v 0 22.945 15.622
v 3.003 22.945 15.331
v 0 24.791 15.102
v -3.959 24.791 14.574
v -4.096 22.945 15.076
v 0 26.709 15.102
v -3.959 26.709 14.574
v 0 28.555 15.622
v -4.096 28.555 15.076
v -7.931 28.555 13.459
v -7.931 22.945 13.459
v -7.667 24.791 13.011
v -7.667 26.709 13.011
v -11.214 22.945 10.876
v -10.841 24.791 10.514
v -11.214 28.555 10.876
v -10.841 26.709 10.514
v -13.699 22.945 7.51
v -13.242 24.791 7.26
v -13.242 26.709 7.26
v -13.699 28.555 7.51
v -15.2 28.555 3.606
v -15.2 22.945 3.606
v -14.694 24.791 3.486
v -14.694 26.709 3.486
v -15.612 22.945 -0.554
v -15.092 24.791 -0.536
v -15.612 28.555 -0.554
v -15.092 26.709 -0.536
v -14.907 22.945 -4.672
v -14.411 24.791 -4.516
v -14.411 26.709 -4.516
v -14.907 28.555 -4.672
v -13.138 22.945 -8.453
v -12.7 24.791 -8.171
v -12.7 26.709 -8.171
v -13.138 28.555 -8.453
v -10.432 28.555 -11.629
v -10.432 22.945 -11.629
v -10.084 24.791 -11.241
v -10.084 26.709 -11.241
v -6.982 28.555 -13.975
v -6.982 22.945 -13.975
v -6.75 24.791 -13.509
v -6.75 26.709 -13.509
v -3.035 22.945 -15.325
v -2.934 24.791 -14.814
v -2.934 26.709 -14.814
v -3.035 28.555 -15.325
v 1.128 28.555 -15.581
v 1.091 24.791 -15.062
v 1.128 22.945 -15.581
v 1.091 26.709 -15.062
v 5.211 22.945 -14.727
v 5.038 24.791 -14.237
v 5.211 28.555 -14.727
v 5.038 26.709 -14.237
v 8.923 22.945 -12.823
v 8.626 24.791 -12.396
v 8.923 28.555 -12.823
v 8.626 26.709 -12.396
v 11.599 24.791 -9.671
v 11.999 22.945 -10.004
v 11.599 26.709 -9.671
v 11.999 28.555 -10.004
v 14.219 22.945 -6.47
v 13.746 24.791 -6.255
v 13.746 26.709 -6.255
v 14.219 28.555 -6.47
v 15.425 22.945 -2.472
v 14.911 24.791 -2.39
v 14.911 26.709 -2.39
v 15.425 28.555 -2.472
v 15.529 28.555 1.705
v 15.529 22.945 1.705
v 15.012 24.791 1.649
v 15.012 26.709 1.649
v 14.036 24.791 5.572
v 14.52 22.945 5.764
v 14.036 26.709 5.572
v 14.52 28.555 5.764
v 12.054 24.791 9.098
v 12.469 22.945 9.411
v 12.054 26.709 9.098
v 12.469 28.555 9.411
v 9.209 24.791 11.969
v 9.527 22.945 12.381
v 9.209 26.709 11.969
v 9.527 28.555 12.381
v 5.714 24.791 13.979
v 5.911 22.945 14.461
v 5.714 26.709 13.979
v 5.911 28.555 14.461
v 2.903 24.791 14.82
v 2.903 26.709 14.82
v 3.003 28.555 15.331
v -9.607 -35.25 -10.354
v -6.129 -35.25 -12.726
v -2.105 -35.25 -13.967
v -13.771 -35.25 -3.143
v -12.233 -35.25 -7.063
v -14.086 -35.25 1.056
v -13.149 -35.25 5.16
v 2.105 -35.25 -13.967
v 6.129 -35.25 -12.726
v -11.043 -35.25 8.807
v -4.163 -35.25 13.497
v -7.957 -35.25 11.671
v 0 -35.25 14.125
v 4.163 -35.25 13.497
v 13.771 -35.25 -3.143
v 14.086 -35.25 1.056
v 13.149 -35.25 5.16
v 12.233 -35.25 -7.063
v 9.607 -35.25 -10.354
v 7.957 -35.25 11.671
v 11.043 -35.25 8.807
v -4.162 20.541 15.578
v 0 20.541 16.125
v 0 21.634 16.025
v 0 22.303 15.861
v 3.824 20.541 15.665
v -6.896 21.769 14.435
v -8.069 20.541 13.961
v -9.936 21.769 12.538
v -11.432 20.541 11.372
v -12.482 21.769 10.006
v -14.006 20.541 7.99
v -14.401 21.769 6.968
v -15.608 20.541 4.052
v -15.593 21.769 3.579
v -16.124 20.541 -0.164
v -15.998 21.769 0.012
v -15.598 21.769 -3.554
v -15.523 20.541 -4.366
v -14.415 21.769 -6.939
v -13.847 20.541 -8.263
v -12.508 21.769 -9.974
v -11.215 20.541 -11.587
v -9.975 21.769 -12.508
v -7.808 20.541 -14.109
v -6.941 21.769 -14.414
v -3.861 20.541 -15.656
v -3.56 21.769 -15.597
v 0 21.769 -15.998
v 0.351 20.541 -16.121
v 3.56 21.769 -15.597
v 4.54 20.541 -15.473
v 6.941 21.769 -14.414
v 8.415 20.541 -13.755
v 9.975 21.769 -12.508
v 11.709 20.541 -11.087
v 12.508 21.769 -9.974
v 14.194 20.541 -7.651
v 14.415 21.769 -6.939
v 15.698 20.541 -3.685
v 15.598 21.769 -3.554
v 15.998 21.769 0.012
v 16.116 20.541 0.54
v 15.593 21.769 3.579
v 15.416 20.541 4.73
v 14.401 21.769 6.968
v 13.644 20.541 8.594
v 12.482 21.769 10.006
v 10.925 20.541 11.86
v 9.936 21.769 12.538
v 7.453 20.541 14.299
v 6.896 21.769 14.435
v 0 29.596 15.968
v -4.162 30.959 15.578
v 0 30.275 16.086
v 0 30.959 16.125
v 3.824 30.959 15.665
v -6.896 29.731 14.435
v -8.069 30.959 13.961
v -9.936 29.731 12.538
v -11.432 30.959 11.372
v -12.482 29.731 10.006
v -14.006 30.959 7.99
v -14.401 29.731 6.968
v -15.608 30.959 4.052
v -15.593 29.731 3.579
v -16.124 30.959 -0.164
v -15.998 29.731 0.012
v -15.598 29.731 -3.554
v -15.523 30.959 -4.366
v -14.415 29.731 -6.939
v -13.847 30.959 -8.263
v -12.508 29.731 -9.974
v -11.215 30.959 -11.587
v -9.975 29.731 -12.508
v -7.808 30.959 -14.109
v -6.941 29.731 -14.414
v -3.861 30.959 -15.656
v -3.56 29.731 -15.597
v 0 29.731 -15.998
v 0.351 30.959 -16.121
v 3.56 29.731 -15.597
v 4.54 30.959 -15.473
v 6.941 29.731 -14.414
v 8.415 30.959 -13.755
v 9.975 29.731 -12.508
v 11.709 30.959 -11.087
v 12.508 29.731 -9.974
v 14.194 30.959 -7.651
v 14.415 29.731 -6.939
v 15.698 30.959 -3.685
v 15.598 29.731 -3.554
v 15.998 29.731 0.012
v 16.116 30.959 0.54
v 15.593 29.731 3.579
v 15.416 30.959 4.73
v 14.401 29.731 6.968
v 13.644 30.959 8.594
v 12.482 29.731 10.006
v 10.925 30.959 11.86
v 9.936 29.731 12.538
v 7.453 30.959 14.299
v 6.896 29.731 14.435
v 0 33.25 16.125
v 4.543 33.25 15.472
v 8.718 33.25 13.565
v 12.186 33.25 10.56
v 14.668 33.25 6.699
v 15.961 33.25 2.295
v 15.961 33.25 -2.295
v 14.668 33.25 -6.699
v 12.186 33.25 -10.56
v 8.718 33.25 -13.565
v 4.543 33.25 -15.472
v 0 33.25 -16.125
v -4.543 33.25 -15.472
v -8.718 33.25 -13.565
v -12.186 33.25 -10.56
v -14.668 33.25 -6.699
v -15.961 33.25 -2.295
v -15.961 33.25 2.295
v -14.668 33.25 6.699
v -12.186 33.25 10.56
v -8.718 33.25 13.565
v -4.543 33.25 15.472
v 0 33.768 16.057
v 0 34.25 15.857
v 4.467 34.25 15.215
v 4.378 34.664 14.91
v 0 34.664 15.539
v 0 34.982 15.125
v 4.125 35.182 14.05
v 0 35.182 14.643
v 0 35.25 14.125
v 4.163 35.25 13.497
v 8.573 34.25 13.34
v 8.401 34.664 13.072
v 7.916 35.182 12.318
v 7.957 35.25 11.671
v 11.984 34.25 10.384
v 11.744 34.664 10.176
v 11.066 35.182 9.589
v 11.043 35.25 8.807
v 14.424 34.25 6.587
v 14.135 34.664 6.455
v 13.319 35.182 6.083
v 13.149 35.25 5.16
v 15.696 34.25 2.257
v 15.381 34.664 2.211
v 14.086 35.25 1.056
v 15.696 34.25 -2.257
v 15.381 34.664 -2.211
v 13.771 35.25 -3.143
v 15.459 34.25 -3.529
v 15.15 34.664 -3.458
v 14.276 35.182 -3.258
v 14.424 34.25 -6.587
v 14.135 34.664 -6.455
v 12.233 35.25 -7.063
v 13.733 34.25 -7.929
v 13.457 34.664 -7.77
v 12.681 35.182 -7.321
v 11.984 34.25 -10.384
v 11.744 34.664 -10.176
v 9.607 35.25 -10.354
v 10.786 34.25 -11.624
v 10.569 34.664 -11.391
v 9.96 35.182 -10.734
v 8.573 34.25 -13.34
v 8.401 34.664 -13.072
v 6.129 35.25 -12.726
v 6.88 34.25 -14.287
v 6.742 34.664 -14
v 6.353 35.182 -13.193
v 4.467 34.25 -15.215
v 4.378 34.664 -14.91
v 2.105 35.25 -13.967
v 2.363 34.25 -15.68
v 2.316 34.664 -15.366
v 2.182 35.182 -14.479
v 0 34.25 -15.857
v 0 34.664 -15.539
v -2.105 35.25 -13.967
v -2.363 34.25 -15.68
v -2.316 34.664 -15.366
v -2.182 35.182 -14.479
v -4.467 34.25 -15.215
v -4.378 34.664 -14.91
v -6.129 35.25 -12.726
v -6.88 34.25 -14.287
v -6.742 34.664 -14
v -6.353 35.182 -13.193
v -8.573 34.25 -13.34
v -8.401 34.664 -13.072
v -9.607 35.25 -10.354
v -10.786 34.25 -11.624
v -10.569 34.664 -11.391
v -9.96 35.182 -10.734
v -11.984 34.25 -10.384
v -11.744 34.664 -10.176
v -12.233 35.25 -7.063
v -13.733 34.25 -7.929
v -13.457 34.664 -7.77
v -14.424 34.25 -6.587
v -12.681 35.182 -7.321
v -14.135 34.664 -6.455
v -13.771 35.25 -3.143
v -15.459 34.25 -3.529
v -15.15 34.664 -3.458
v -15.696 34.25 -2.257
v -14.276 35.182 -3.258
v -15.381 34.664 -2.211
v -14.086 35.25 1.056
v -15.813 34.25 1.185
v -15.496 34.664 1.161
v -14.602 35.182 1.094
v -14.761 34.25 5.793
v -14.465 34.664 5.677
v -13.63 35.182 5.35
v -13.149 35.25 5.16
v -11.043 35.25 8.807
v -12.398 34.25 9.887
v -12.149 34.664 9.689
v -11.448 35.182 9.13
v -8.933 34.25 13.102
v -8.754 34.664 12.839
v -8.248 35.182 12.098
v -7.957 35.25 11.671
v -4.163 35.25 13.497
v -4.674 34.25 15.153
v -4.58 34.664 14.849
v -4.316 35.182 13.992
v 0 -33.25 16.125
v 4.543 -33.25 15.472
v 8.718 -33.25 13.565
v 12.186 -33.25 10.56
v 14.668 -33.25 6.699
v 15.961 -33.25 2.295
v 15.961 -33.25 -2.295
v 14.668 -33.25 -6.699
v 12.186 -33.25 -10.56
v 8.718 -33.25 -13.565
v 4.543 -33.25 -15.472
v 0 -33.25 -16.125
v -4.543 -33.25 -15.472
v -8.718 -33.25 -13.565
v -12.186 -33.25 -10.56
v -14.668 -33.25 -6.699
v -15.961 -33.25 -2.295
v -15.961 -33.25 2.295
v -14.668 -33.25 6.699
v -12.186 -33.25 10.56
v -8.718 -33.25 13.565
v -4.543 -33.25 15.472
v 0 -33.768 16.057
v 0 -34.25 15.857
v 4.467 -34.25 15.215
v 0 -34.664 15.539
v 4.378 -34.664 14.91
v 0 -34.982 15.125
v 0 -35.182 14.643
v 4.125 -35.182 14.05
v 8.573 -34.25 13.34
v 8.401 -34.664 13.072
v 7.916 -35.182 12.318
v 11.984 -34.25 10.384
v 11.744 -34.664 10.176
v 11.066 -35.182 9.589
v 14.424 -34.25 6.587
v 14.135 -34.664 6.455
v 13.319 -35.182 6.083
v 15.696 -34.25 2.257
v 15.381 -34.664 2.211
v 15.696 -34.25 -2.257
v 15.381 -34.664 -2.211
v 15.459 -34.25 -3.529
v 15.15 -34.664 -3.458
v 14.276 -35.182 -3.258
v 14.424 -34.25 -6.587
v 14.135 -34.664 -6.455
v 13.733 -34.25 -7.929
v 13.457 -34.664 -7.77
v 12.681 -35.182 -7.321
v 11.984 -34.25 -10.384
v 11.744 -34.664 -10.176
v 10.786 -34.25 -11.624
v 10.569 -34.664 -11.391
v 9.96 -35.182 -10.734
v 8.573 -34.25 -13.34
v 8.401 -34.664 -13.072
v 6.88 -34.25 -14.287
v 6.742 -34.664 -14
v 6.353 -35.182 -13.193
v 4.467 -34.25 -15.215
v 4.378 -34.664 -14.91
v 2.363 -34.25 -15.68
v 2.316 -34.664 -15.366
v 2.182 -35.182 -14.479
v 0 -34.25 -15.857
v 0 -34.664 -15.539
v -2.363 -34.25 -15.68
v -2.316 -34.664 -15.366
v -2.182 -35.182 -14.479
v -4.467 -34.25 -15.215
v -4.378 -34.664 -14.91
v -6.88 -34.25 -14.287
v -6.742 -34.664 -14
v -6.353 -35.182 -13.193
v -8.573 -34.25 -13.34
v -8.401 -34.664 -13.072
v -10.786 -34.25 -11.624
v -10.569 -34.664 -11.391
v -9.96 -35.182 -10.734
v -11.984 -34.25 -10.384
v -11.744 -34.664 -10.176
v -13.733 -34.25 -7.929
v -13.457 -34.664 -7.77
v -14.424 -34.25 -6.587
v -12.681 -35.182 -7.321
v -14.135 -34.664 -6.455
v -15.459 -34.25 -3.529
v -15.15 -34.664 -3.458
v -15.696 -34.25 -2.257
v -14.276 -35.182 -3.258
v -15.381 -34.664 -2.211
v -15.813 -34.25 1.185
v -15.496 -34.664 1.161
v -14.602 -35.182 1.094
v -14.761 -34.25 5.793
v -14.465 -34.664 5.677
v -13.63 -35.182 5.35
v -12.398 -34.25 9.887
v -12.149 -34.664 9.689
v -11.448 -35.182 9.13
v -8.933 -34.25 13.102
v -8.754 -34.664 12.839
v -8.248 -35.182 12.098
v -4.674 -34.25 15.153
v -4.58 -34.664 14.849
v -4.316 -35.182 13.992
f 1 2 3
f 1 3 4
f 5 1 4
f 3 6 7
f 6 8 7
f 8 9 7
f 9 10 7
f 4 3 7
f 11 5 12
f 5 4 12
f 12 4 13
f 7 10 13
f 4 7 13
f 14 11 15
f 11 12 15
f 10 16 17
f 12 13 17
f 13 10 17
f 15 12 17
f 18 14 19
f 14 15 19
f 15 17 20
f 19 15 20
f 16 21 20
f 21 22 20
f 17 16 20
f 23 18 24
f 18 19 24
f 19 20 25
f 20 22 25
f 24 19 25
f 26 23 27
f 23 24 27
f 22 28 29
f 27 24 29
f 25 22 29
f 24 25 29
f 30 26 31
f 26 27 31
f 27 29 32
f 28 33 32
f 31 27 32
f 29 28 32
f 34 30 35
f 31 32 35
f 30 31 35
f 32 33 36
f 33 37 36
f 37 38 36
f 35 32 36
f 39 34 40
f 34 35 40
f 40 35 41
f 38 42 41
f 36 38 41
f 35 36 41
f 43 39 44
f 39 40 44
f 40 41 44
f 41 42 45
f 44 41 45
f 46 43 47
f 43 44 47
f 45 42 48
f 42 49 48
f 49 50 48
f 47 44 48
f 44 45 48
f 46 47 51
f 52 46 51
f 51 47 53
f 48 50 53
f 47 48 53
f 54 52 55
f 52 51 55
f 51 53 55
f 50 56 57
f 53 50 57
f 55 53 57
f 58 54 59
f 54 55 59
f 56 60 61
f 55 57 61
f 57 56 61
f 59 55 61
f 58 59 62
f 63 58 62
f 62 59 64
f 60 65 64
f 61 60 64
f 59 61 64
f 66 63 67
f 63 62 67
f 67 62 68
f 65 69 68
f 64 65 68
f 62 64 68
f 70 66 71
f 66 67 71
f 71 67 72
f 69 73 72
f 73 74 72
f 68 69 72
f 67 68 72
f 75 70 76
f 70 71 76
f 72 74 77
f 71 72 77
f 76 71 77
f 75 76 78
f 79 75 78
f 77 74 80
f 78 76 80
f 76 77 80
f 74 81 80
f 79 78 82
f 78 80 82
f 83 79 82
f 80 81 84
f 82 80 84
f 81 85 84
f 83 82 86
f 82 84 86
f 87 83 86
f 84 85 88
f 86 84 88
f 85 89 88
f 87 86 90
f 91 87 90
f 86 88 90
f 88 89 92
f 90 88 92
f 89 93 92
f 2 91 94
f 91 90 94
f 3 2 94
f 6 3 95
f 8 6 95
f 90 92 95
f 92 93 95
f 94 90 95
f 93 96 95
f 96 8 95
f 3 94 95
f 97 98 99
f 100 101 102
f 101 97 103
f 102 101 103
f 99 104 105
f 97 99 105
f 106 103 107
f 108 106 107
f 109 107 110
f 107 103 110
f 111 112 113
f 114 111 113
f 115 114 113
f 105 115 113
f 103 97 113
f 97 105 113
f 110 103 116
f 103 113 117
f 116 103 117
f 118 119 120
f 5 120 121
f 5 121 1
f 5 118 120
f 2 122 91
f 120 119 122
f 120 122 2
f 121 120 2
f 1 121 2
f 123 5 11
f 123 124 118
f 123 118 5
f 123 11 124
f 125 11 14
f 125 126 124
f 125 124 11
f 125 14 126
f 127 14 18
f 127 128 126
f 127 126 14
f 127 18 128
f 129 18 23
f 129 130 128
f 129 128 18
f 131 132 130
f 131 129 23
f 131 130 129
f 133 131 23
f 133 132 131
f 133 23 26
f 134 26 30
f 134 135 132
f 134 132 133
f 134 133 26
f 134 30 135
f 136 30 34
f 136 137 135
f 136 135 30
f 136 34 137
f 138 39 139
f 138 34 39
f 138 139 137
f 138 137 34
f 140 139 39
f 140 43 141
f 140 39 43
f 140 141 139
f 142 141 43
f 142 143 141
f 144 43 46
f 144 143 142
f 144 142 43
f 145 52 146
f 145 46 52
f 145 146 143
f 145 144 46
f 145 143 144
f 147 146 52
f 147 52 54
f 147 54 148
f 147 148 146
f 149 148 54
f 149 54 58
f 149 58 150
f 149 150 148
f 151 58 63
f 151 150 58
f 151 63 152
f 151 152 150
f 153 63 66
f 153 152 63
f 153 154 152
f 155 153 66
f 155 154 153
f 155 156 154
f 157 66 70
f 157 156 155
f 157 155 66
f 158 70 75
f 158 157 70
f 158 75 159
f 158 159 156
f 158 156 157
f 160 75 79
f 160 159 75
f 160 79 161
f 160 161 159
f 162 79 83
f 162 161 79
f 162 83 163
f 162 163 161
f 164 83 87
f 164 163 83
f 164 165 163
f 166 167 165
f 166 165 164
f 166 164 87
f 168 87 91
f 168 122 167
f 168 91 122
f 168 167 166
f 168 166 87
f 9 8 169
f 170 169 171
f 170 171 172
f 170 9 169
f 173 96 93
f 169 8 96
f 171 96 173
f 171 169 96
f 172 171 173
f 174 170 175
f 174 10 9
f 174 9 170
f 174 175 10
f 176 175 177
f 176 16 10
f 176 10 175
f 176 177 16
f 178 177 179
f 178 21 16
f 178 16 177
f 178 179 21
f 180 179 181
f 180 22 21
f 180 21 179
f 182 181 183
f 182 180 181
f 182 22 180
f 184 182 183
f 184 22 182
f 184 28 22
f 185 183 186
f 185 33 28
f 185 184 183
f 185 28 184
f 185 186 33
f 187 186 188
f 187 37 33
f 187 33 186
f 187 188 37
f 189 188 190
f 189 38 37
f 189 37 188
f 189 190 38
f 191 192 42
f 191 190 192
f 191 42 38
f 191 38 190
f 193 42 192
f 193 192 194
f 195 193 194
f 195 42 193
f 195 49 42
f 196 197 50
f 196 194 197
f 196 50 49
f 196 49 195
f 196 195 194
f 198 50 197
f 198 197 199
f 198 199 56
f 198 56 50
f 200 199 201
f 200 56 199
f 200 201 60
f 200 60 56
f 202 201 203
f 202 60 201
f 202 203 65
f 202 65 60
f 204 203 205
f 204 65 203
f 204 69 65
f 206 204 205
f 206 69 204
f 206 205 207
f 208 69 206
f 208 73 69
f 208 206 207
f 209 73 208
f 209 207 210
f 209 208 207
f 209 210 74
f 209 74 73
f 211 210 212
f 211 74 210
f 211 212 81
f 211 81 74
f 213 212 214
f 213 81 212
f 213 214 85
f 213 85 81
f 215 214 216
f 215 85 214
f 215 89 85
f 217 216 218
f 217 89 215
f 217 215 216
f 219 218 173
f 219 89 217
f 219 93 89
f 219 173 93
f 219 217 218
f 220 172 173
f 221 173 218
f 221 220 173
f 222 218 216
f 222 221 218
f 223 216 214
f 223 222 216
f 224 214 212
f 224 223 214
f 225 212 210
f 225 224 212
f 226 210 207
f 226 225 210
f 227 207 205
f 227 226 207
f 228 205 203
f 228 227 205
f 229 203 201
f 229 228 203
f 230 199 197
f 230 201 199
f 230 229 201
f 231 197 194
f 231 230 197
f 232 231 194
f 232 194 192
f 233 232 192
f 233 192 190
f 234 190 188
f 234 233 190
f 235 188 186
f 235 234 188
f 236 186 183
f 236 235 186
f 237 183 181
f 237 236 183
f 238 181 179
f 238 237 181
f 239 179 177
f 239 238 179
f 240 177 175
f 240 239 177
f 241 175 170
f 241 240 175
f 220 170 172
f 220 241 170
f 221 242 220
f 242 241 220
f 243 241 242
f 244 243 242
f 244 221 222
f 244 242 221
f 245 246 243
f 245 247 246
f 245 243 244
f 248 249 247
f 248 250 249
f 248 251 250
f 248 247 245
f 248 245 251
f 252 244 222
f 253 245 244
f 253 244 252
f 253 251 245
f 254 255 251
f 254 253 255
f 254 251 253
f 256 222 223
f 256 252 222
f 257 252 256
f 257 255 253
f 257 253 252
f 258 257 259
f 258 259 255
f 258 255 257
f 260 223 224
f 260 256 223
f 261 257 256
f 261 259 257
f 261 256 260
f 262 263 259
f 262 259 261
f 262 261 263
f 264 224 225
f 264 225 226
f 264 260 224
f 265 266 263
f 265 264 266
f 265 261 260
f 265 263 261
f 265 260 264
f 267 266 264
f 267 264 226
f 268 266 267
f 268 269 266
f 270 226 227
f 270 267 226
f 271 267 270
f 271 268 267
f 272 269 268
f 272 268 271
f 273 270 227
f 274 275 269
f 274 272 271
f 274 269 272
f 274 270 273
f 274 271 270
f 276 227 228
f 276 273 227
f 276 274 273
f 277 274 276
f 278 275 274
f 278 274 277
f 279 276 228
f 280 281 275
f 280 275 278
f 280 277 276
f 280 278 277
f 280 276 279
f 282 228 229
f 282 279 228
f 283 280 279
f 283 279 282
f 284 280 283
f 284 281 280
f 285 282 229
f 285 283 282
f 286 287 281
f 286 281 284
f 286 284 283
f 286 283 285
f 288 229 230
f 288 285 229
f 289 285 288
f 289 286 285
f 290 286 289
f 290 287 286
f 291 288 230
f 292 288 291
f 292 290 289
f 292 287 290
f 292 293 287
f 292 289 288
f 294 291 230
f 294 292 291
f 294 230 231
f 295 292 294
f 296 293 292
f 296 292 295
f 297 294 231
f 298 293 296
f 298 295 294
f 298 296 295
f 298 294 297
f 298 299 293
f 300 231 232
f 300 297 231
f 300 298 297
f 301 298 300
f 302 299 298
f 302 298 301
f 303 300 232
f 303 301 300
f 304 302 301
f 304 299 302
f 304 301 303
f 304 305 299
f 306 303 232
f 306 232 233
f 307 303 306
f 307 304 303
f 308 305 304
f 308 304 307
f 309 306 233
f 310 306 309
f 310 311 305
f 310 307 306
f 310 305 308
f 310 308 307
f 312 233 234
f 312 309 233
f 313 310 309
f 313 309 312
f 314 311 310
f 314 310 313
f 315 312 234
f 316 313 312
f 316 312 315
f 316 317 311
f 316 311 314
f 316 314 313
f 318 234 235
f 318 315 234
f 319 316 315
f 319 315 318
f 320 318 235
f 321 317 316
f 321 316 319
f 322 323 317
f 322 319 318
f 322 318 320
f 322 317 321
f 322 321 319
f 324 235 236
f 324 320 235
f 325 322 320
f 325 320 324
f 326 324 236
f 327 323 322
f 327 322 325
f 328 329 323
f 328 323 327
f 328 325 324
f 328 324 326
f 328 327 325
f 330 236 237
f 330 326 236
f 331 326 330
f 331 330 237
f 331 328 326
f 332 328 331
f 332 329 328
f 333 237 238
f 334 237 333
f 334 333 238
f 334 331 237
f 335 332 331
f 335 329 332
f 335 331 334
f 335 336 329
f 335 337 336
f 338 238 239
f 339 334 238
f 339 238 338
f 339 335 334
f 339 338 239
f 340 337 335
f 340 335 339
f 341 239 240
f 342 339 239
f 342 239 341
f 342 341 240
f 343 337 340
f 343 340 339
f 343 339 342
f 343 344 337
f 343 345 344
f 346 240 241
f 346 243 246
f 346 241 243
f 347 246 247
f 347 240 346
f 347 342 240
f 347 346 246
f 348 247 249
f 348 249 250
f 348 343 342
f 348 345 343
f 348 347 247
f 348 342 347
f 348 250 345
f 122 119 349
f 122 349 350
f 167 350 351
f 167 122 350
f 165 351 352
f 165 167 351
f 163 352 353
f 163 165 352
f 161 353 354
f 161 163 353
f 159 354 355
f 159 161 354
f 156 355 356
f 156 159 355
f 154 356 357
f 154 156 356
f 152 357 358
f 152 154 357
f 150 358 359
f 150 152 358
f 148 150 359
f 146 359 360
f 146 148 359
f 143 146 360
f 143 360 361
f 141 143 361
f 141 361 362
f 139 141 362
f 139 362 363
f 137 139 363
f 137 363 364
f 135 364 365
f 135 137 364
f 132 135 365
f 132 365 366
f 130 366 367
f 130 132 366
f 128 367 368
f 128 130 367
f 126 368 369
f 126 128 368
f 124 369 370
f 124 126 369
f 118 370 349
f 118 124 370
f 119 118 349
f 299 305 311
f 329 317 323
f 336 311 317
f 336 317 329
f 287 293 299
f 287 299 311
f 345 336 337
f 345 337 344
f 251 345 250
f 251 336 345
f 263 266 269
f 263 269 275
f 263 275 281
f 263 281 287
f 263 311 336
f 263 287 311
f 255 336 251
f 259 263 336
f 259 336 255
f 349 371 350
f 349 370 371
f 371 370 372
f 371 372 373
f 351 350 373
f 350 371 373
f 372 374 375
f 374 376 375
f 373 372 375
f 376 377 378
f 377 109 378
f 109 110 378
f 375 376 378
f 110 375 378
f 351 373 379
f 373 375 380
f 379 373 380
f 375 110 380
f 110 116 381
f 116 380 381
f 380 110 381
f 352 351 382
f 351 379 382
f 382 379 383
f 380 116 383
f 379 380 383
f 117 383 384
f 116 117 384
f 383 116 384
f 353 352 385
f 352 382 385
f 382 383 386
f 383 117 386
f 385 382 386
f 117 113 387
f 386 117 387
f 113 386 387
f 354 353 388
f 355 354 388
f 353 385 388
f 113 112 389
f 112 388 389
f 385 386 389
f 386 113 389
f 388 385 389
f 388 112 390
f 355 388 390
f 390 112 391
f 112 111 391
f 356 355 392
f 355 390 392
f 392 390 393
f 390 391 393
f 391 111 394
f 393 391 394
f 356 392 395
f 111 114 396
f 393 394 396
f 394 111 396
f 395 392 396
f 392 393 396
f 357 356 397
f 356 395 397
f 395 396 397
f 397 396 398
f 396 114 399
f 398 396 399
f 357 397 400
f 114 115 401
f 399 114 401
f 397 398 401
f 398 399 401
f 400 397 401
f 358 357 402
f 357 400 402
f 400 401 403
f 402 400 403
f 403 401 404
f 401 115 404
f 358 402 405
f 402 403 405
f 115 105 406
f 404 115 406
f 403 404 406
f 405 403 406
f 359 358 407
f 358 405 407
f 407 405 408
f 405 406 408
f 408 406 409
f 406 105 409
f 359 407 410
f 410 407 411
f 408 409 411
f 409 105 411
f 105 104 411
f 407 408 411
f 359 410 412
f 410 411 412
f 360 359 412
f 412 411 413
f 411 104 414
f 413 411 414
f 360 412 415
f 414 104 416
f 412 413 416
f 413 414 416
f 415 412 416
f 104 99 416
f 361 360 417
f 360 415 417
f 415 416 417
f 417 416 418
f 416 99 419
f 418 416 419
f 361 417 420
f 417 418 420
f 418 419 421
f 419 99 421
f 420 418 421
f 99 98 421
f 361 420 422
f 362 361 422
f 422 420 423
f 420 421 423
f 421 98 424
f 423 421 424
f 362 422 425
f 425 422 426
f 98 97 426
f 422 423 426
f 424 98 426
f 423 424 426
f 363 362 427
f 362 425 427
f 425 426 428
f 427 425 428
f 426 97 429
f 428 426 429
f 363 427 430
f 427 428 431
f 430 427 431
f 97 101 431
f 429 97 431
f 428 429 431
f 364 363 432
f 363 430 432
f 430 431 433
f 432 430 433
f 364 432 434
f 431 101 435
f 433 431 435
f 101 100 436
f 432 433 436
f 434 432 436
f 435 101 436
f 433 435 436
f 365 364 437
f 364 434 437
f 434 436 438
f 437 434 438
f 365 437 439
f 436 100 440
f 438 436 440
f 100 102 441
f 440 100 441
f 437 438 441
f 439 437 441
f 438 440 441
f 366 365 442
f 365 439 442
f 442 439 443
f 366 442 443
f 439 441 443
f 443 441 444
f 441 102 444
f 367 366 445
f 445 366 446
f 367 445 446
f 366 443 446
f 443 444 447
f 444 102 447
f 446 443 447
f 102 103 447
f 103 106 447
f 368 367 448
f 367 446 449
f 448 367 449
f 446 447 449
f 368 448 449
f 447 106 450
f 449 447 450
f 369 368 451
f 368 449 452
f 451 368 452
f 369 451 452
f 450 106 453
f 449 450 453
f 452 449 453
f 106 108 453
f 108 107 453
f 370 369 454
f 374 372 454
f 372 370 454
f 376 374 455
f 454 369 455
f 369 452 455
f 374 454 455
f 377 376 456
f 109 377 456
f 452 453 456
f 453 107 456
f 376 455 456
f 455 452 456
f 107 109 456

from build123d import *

# Parameters (mm, degrees)
SKETCH1_R           = 16.125
BOSS_EXTRUDE1_DEPTH = 35.25
FILLET1_R           = 2
FILLET2_R           = 6


with BuildPart() as part:
    # Sketch1 → Boss-Extrude1 (new, symmetric)
    with BuildSketch(Plane(origin=(0, 0, 0), x_dir=(1, 0, 0), z_dir=(0, 1, 0))):
        with Locations(Location((0, 0, 0), (0, 0, 270))):
            Circle(SKETCH1_R)
    extrude(amount=BOSS_EXTRUDE1_DEPTH, both=True)

    # Fillet1
    fillet1_edges = [part.edges().sort_by_distance(p)[0] for p in [
        (0, -35.25, -16.125),
        (0, 35.25, -16.125),
    ]]
    fillet(fillet1_edges, radius=FILLET1_R)

    # Sketch2 → Cut-Revolve1 (revolve, cut)
    with BuildSketch(Plane.XY, mode=Mode.PRIVATE) as cut_revolve1_sk:
        with BuildLine():
            ThreePointArc((16.125, 22), (15.035795209, 25.75), (16.125, 29.5))
            Line((16.125, 29.5), (16.125, 22))
        make_face()
    revolve(cut_revolve1_sk.sketch.rotate(Axis((0, 35.25, 0), (0, -1, 0)), 90), axis=Axis((0, 35.25, 0), (0, -1, 0)), mode=Mode.SUBTRACT)

    # Fillet2
    fillet2_edges = [part.edges().sort_by_distance(p)[0] for p in [
        (0, 29.5, -16.125),
        (0, 22, -16.125),
    ]]
    fillet(fillet2_edges, radius=FILLET2_R)


solid = part.part
